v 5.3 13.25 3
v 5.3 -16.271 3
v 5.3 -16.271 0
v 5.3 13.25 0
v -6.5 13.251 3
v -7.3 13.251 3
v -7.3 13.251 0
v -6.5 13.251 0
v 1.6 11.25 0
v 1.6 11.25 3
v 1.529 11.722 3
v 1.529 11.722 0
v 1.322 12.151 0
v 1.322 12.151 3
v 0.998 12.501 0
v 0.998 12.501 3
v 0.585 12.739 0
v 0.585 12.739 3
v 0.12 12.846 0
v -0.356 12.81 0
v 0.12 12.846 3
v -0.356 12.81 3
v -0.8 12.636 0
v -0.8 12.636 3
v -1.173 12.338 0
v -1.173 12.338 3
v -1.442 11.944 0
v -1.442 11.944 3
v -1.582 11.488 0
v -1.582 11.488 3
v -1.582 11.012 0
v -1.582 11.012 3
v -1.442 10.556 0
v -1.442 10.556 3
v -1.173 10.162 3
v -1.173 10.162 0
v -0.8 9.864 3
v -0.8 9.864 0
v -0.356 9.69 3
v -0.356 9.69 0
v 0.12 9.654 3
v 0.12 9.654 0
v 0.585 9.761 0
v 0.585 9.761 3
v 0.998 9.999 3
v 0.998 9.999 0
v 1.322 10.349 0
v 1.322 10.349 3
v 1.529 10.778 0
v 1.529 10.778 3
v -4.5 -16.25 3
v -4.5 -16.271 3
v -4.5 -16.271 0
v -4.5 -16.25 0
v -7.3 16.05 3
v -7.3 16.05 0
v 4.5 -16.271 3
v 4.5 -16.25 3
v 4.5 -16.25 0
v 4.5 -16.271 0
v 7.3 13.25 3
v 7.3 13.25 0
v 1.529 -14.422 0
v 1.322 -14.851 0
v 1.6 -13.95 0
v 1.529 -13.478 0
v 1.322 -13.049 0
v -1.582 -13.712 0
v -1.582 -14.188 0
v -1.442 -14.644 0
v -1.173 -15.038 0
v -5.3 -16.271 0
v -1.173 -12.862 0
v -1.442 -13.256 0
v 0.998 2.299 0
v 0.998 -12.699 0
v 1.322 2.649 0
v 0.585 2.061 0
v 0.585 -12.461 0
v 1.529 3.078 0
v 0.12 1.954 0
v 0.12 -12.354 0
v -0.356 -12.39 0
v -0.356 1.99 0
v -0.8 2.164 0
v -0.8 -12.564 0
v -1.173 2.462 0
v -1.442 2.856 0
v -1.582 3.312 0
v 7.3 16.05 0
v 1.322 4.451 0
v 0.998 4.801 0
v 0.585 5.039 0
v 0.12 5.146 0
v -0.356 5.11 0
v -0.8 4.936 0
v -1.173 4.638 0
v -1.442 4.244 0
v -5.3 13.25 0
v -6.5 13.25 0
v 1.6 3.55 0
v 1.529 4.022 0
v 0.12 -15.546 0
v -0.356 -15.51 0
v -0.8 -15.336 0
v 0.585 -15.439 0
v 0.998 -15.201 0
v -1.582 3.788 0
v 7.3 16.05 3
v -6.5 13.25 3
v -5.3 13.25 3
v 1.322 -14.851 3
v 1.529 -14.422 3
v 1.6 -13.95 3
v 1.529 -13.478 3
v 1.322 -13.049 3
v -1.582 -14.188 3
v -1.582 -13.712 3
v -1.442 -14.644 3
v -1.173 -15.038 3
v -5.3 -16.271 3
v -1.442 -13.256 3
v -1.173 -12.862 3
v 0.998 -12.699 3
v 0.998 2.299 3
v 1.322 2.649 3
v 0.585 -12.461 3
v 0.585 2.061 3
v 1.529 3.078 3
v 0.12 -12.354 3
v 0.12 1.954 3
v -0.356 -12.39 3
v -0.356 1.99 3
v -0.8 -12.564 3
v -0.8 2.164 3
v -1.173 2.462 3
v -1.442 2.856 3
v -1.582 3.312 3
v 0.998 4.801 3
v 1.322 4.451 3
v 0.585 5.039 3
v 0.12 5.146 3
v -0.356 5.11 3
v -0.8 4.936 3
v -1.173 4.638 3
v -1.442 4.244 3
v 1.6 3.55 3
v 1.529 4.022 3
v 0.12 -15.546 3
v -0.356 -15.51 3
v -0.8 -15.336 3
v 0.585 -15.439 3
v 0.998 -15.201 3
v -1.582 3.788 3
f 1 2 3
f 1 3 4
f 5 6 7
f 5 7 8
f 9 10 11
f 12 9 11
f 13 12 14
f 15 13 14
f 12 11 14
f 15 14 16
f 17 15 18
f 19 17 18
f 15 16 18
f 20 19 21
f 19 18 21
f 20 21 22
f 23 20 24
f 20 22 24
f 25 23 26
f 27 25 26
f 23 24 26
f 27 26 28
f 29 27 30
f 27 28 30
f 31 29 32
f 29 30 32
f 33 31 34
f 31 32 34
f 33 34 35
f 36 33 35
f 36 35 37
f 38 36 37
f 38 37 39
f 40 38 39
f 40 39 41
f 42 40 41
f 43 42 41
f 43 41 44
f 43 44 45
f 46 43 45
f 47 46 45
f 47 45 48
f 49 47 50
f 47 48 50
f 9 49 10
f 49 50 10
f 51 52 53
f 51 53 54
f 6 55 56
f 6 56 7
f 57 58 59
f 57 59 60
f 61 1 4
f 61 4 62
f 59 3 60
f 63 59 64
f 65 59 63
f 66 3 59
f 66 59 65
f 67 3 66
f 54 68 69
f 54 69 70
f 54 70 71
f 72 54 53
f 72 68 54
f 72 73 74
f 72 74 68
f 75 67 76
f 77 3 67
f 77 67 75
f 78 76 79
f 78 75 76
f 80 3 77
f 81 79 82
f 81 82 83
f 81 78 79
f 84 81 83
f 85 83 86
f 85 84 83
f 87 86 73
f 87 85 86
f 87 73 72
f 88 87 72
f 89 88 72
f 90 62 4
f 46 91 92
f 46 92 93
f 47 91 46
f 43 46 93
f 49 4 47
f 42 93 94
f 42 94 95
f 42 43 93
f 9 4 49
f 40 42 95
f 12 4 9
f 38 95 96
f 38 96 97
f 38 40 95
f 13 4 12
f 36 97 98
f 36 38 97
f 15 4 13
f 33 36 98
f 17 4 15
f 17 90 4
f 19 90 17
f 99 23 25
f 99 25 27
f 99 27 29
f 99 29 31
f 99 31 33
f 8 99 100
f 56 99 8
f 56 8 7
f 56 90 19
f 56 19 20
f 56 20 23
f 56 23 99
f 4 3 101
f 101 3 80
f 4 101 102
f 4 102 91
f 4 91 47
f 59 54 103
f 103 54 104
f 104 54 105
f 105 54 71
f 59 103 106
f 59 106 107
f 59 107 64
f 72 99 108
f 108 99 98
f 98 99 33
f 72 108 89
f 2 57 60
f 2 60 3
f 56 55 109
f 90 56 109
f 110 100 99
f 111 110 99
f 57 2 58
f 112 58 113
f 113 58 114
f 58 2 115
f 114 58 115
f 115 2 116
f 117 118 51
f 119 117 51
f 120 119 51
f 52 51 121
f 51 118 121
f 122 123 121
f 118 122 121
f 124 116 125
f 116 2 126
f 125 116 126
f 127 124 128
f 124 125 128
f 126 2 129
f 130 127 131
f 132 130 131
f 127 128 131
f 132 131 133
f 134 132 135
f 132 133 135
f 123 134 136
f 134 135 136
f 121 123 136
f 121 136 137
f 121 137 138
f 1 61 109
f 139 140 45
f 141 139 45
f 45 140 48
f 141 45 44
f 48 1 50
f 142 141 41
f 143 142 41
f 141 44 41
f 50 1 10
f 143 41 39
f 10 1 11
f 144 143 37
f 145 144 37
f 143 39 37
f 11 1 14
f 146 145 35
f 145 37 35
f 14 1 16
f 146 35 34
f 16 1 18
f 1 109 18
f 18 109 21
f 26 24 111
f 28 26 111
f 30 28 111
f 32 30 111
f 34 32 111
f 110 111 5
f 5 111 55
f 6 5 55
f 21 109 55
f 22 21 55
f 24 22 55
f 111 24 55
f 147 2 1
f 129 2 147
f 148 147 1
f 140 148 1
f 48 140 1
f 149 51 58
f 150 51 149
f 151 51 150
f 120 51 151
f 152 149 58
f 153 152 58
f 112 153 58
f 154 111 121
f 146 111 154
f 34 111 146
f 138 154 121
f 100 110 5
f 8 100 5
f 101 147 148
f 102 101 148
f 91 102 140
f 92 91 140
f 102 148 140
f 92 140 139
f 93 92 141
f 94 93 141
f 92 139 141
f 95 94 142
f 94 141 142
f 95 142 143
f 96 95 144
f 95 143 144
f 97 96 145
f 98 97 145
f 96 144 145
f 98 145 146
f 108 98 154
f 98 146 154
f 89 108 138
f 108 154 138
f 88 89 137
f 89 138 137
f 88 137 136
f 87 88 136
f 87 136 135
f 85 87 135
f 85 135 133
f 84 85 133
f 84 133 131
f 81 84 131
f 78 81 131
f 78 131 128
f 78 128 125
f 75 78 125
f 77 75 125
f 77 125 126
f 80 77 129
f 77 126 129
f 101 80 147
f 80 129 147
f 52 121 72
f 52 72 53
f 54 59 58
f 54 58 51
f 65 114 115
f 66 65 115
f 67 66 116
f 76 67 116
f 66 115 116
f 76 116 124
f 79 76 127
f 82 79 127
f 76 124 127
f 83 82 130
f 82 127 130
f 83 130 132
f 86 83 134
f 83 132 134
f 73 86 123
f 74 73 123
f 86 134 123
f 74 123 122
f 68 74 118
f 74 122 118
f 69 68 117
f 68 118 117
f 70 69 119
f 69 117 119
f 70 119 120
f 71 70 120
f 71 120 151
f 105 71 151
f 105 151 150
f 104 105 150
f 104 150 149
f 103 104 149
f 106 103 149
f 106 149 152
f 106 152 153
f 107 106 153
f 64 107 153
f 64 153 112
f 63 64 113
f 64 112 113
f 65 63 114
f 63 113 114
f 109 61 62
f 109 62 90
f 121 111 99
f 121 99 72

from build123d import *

# Parameters (mm, degrees)
SKIZZE1_W                       = 2.5
SKIZZE1_H                       = 3
SKIZZE1_W_2                     = 7
SKIZZE1_H_2                     = 7
SKIZZE1_R                       = 1.25
SKIZZE1_H_3                     = 22.5
SKIZZE1_R_2                     = 1.5
AUFSATZ_LINEAR_AUSTRAGEN1_DEPTH = 3
SKIZZE2_W                       = 2
SKIZZE2_H                       = 29.5
SKIZZE2_W_2                     = 1.5
SKIZZE2_H_2                     = 3
AUFSATZ_LINEAR_AUSTRAGEN2_DEPTH = 3
SKIZZE3_W                       = 1
SKIZZE3_H                       = 1
SKIZZE3_H_2                     = 2
SKIZZE3_W_2                     = 13
SKIZZE3_H_3                     = 29.5
SCHNITT_LINEAR_AUSTRAGEN1_DEPTH = 10
SKIZZE4_W                       = 0.8
SKIZZE4_H                       = 1.999250504
SKIZZE4_H_2                     = 2
AUFSATZ_LINEAR_AUSTRAGEN3_DEPTH = 3
SKIZZE5_R                       = 1.6
SCHNITT_LINEAR_AUSTRAGEN2_DEPTH = 3


with BuildPart() as part:
    # Skizze1 → Aufsatz-Linear austragen1 (new body)
    # profile 1 of 5: a face of its own
    with BuildSketch(Plane.XY):
        with Locations((4.75, 14.75)):
            Rectangle(SKIZZE1_W, SKIZZE1_H)
    # profile 2 of 5: a face of its own
    with BuildSketch(Plane.XY):
        with Locations((0, 14.75)):
            Rectangle(SKIZZE1_W_2, SKIZZE1_H)
    # profile 3 of 5: a face of its own
    with BuildSketch(Plane.XY):
        with Locations((-4.75, 14.75)):
            Rectangle(SKIZZE1_W, SKIZZE1_H)
    # profile 4 of 5: a face of its own
    with BuildSketch(Plane.XY):
        with Locations((0, 9.75)):
            Rectangle(SKIZZE1_W_2, SKIZZE1_H_2)
        with Locations((0, 11.25)):
            Circle(SKIZZE1_R, mode=Mode.SUBTRACT)
    # profile 5 of 5: a face of its own
    with BuildSketch(Plane.XY):
        with Locations((0, -5)):
            Rectangle(SKIZZE1_W_2, SKIZZE1_H_3)
        with Locations((0, -13.95)):
            Circle(SKIZZE1_R_2, mode=Mode.SUBTRACT)
        with Locations((0, 3.55)):
            Circle(SKIZZE1_R_2, mode=Mode.SUBTRACT)
    extrude(amount=AUFSATZ_LINEAR_AUSTRAGEN1_DEPTH)

    # Skizze2 → Aufsatz-Linear austragen2 (add)
    with BuildSketch(Plane(origin=(0, 0, 0), x_dir=(-1, 0, 0), z_dir=(0, 0, -1))):
        with Locations((-4.5, -1.5)):
            Rectangle(SKIZZE2_W, SKIZZE2_H)
        with Locations((4.5, -1.5)):
            Rectangle(SKIZZE2_W, SKIZZE2_H)
        with Locations((6.75, 14.75)):
            Rectangle(SKIZZE2_W_2, SKIZZE2_H_2)
        with Locations((-6.75, 14.75)):
            Rectangle(SKIZZE2_W_2, SKIZZE2_H_2)
    extrude(amount=-AUFSATZ_LINEAR_AUSTRAGEN2_DEPTH)

    # Skizze3 → Schnitt-Linear austragen1 (cut)
    with BuildSketch(Plane.XY.offset(3)):
        with Locations((-7, 15.75)):
            Rectangle(SKIZZE3_W, SKIZZE3_H)
        with Locations((-7, 14.25)):
            Rectangle(SKIZZE3_W, SKIZZE3_H_2)
        with Locations((0, 15.75)):
            Rectangle(SKIZZE3_W_2, SKIZZE3_H)
        with Locations((7, 15.75)):
            Rectangle(SKIZZE3_W, SKIZZE3_H)
        with Locations((7, 14.25)):
            Rectangle(SKIZZE3_W, SKIZZE3_H_2)
        with Locations((5, -1.5)):
            Rectangle(SKIZZE3_W, SKIZZE3_H_3)
        with Locations((-5, -1.5)):
            Rectangle(SKIZZE3_W, SKIZZE3_H_3)
    extrude(amount=-SCHNITT_LINEAR_AUSTRAGEN1_DEPTH, mode=Mode.SUBTRACT)

    # Skizze4 → Aufsatz-Linear austragen3 (add)
    with BuildSketch(Plane.XY.offset(3)):
        Polygon((-7.3, 15.25), (-7.3, 16.05), (7.3, 16.05), (7.3, 15.25), (6.5, 15.25), (-6.5, 15.25), align=None)
        with Locations((-6.9, 14.250374748)):
            Rectangle(SKIZZE4_W, SKIZZE4_H)
        Polygon((-4.5, 13.25), (-5.3, 13.25), (-5.3, -16.271198208), (-4.5, -16.271198208), (-4.5, -16.25), align=None)
        Polygon((5.3, -16.271198208), (5.3, 13.25), (4.5, 13.25), (4.5, -16.25), (4.5, -16.271198208), align=None)
        with Locations((6.9, 14.25)):
            Rectangle(SKIZZE4_W, SKIZZE4_H_2)
    extrude(amount=-AUFSATZ_LINEAR_AUSTRAGEN3_DEPTH)

    # Skizze5 → Schnitt-Linear austragen2 (cut)
    with BuildSketch(Plane.XY.offset(3)):
        with Locations((0, 11.25)):
            Circle(SKIZZE5_R)
        with Locations((0, 3.55)):
            Circle(SKIZZE5_R)
        with Locations((0, -13.95)):
            Circle(SKIZZE5_R)
    extrude(amount=-SCHNITT_LINEAR_AUSTRAGEN2_DEPTH, mode=Mode.SUBTRACT)


solid = part.part
